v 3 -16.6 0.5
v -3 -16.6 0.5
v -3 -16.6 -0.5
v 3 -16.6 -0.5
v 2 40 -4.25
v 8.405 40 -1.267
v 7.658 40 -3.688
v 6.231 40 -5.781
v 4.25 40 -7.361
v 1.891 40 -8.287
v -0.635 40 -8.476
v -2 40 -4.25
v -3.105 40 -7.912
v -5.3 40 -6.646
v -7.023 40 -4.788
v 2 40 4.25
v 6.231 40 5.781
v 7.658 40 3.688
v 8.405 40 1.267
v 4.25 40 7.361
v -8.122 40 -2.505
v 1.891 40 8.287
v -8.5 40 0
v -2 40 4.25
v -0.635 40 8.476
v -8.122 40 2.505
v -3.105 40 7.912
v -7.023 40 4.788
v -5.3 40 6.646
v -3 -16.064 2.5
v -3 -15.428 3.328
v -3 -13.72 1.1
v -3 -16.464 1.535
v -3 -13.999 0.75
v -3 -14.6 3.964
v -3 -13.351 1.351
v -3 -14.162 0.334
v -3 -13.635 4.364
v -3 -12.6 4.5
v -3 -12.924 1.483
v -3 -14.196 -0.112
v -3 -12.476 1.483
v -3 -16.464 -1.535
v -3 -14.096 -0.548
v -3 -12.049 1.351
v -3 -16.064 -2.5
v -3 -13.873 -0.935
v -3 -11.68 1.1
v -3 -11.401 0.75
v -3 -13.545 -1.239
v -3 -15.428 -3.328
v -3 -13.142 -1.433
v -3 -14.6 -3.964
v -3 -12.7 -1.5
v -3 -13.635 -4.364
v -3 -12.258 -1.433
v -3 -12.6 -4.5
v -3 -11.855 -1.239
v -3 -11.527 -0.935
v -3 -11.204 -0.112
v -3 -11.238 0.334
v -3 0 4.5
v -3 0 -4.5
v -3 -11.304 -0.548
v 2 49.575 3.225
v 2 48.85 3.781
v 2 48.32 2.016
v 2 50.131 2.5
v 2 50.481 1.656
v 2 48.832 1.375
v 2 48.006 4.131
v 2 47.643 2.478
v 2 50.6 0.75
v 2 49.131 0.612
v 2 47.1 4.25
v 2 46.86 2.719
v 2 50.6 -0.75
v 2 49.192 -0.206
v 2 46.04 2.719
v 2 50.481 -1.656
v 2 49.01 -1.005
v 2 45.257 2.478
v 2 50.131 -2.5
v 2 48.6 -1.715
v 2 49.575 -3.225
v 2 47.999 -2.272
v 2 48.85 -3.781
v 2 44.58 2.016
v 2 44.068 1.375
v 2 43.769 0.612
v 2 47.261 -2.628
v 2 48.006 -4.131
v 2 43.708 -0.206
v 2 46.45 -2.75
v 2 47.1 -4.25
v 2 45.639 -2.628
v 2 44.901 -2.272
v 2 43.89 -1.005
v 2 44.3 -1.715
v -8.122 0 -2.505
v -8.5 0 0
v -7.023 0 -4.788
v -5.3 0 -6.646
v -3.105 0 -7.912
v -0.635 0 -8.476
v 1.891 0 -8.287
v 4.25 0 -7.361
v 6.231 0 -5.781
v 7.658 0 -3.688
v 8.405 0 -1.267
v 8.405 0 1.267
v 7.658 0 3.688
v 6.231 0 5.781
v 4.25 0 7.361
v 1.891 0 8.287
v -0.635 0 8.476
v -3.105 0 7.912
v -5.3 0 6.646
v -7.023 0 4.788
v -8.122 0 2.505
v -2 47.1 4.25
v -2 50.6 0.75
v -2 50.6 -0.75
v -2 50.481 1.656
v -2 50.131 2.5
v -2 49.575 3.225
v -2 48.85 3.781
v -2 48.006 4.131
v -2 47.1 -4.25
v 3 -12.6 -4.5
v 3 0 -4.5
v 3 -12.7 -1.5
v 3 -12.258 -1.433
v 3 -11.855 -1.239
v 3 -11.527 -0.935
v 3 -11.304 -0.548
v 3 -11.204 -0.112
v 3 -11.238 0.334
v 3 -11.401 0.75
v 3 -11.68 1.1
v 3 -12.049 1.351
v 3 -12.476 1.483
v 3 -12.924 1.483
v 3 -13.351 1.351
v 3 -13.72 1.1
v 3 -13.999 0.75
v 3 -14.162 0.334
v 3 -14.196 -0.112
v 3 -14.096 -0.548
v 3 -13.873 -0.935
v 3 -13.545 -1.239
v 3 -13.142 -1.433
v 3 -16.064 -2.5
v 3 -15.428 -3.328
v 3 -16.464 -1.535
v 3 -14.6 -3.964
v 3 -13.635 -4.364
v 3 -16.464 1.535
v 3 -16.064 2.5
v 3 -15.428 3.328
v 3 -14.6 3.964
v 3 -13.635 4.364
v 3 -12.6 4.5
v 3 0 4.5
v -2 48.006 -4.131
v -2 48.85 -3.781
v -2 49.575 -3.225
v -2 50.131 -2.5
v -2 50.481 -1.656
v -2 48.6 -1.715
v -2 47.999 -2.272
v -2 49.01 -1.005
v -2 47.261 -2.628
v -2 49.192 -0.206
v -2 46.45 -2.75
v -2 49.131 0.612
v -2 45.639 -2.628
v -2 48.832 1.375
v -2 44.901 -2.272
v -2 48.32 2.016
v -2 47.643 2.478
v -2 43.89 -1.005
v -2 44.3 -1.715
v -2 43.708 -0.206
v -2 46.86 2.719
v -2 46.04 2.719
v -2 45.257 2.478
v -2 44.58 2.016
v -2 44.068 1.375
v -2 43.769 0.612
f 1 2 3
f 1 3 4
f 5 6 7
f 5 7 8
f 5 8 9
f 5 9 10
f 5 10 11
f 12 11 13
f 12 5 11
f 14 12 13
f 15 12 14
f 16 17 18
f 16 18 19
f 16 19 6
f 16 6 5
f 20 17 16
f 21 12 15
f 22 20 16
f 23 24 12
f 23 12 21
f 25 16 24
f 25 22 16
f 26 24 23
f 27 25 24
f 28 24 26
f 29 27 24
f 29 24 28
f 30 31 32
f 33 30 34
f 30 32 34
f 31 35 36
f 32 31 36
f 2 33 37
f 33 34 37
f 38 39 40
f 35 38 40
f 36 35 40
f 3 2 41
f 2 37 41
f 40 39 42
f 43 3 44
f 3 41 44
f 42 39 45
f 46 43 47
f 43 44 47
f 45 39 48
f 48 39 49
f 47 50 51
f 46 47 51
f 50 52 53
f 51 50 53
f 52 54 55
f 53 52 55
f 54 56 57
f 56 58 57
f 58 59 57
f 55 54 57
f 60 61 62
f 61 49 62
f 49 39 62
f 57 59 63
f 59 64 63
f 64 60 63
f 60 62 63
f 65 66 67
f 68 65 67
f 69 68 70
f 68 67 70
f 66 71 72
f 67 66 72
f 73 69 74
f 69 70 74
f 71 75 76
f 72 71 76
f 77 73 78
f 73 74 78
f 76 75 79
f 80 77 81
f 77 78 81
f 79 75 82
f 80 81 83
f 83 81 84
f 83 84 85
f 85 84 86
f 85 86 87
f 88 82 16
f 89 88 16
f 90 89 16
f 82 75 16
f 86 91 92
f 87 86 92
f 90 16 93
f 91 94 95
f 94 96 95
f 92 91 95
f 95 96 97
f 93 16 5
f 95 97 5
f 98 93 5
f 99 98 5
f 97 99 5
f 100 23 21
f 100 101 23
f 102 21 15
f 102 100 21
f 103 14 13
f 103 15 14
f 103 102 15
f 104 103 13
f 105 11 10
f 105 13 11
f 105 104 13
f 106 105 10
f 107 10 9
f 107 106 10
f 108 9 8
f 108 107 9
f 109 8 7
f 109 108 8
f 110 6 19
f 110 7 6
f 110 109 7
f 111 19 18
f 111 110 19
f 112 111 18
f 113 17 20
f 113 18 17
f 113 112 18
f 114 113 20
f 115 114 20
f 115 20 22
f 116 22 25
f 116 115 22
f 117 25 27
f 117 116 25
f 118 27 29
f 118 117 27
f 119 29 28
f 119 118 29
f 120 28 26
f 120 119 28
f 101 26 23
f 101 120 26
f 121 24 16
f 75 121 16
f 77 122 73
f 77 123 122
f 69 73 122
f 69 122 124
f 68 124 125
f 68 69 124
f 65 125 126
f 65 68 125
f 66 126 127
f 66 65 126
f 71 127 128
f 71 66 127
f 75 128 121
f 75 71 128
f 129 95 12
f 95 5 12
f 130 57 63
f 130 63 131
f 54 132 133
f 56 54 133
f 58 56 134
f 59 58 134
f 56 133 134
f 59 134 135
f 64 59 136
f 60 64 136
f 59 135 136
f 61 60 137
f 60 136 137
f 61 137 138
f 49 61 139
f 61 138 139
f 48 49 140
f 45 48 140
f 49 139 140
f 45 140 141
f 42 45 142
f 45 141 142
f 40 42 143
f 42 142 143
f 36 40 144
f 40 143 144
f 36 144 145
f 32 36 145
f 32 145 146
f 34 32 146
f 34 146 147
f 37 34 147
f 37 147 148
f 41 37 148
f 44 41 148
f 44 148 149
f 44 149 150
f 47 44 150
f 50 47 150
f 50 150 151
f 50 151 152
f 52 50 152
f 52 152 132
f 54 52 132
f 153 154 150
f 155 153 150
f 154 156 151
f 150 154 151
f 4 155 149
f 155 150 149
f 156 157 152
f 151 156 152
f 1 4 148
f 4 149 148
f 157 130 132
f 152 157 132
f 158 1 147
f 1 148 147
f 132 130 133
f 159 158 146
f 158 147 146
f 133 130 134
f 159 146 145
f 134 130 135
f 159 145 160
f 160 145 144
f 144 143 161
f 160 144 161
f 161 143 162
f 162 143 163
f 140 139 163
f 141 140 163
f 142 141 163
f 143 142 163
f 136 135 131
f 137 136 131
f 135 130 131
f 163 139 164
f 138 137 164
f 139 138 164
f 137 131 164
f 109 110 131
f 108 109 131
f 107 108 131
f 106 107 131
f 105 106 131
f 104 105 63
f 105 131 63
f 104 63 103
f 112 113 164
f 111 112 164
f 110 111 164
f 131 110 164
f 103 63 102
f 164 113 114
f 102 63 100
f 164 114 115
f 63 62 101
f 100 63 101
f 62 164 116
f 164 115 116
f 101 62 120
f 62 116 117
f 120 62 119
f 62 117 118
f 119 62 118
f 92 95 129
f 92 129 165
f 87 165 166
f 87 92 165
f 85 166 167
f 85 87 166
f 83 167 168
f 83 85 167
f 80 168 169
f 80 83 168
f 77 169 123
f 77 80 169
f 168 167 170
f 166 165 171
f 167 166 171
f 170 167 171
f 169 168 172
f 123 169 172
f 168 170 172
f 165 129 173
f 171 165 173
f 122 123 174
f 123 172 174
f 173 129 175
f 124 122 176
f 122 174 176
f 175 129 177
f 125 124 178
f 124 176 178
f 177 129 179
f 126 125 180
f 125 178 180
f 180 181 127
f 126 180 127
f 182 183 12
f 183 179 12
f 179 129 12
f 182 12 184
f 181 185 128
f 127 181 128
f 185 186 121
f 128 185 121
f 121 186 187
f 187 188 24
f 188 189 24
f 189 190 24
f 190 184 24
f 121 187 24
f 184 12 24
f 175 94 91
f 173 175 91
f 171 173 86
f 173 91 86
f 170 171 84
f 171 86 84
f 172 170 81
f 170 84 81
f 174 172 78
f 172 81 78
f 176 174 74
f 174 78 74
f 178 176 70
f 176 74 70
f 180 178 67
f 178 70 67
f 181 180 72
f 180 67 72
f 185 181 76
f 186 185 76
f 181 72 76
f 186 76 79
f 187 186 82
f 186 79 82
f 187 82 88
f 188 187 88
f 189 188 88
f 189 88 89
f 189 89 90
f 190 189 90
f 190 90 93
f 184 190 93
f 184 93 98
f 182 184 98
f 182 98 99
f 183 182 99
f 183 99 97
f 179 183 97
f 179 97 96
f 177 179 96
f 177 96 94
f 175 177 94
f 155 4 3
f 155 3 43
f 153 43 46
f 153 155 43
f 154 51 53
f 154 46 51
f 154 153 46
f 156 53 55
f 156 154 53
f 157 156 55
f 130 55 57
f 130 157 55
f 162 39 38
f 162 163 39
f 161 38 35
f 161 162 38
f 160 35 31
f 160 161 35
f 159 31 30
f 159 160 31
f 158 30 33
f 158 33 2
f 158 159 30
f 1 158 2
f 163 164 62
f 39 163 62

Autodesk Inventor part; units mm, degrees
ref_plane "YZ Plane" through (0, 0, 0) normal (1, 0, 0) x (0, 1, 0)
ref_plane "XZ Plane" through (0, 0, 0) normal (0, 1, 0) x (-1, 0, 0)
ref_plane "XY Plane" through (0, 0, 0) normal (0, 0, 1) x (1, 0, 0)
sketch "Sketch1" plane through (0, 0, 0) normal (0, 1, 0) x (-1, 0, 0)
  circle A0 centre (0, 0) radius 8.5
  dimension "d0" = 17
extrude "Extrusion1" add sketch "Sketch1" along normal blind 40
sketch "Sketch2" plane through (0, 40, 0) normal (0, 1, 0) x (1, 0, 0)
  circle A0 centre (0, 0) radius 8.5 projected
  line L0 (0, 0) -> (0, 4.25)
  line L1 (0, 4.25) -> (-2, 4.25)
  line L2 (-2, 4.25) -> (-2, -4.25)
  line L3 (-2, -4.25) -> (2, -4.25)
  line L4 (2, -4.25) -> (2, 4.25)
  line L5 (2, 4.25) -> (0, 4.25)
  dimension "d3" = 4.25
  dimension "d4" = 2
  dimension "d5" = 8.5
  dimension "d6" = 4
extrude "Extrusion2" add sketch "Sketch2" along normal blind 10.6 contours L5 L4 L3 L2 L1
fillet "Fillet1" radius 3.5 2 edges at (0, 50.6, 4.25) (0, 50.6, -4.25)
sketch "Sketch3" plane through (2, 40, 4.25) normal (1, 0, 0) x (0, 0, -1)
  circle A0 centre (4.25, 6.45) radius 2.75
  line L0 (3.5, 10.6) -> (5, 10.6) projected
  point P0 (4.25, -40)
  dimension "d11" = 5.5
  dimension "d26" = 4.15
extrude "Extrusion3" cut sketch "Sketch3" against normal blind 10.5
sketch "Sketch4" plane through (0, 0, 0) normal (0, -1, 0) x (1, 0, 0)
  circle A0 centre (0, 0) radius 8.5 projected
  line L0 (0, 0) -> (0, 4.5)
  line L1 (0, 4.5) -> (-3, 4.5)
  line L2 (-3, 4.5) -> (-3, -4.5)
  line L3 (-3, -4.5) -> (3, -4.5)
  line L4 (3, -4.5) -> (3, 4.5)
  line L5 (3, 4.5) -> (0, 4.5)
  dimension "d14" = 4.5
  dimension "d15" = 3
  dimension "d16" = 9
  dimension "d17" = 6
extrude "Extrusion4" add sketch "Sketch4" along normal blind 16.6 contours L5 L4 L3 L2 L1
fillet "Fillet2" radius 4 2 edges at (0, -16.6, -4.5) (0, -16.6, 4.5)
sketch "Sketch5" plane through (3, 0, 4.5) normal (1, 0, 0) x (0, 0, -1)
  circle A0 centre (4.5, -12.7) radius 1.5
  line L0 (4, -16.6) -> (5, -16.6) projected
  point P0 (4.5, 0)
  dimension "d22" = 3
  dimension "d27" = 3.9
extrude "Extrusion5" cut sketch "Sketch5" against normal blind 16.5
equation "\"d15\" = 0.5 * d17"
properties part number "pruzina"
